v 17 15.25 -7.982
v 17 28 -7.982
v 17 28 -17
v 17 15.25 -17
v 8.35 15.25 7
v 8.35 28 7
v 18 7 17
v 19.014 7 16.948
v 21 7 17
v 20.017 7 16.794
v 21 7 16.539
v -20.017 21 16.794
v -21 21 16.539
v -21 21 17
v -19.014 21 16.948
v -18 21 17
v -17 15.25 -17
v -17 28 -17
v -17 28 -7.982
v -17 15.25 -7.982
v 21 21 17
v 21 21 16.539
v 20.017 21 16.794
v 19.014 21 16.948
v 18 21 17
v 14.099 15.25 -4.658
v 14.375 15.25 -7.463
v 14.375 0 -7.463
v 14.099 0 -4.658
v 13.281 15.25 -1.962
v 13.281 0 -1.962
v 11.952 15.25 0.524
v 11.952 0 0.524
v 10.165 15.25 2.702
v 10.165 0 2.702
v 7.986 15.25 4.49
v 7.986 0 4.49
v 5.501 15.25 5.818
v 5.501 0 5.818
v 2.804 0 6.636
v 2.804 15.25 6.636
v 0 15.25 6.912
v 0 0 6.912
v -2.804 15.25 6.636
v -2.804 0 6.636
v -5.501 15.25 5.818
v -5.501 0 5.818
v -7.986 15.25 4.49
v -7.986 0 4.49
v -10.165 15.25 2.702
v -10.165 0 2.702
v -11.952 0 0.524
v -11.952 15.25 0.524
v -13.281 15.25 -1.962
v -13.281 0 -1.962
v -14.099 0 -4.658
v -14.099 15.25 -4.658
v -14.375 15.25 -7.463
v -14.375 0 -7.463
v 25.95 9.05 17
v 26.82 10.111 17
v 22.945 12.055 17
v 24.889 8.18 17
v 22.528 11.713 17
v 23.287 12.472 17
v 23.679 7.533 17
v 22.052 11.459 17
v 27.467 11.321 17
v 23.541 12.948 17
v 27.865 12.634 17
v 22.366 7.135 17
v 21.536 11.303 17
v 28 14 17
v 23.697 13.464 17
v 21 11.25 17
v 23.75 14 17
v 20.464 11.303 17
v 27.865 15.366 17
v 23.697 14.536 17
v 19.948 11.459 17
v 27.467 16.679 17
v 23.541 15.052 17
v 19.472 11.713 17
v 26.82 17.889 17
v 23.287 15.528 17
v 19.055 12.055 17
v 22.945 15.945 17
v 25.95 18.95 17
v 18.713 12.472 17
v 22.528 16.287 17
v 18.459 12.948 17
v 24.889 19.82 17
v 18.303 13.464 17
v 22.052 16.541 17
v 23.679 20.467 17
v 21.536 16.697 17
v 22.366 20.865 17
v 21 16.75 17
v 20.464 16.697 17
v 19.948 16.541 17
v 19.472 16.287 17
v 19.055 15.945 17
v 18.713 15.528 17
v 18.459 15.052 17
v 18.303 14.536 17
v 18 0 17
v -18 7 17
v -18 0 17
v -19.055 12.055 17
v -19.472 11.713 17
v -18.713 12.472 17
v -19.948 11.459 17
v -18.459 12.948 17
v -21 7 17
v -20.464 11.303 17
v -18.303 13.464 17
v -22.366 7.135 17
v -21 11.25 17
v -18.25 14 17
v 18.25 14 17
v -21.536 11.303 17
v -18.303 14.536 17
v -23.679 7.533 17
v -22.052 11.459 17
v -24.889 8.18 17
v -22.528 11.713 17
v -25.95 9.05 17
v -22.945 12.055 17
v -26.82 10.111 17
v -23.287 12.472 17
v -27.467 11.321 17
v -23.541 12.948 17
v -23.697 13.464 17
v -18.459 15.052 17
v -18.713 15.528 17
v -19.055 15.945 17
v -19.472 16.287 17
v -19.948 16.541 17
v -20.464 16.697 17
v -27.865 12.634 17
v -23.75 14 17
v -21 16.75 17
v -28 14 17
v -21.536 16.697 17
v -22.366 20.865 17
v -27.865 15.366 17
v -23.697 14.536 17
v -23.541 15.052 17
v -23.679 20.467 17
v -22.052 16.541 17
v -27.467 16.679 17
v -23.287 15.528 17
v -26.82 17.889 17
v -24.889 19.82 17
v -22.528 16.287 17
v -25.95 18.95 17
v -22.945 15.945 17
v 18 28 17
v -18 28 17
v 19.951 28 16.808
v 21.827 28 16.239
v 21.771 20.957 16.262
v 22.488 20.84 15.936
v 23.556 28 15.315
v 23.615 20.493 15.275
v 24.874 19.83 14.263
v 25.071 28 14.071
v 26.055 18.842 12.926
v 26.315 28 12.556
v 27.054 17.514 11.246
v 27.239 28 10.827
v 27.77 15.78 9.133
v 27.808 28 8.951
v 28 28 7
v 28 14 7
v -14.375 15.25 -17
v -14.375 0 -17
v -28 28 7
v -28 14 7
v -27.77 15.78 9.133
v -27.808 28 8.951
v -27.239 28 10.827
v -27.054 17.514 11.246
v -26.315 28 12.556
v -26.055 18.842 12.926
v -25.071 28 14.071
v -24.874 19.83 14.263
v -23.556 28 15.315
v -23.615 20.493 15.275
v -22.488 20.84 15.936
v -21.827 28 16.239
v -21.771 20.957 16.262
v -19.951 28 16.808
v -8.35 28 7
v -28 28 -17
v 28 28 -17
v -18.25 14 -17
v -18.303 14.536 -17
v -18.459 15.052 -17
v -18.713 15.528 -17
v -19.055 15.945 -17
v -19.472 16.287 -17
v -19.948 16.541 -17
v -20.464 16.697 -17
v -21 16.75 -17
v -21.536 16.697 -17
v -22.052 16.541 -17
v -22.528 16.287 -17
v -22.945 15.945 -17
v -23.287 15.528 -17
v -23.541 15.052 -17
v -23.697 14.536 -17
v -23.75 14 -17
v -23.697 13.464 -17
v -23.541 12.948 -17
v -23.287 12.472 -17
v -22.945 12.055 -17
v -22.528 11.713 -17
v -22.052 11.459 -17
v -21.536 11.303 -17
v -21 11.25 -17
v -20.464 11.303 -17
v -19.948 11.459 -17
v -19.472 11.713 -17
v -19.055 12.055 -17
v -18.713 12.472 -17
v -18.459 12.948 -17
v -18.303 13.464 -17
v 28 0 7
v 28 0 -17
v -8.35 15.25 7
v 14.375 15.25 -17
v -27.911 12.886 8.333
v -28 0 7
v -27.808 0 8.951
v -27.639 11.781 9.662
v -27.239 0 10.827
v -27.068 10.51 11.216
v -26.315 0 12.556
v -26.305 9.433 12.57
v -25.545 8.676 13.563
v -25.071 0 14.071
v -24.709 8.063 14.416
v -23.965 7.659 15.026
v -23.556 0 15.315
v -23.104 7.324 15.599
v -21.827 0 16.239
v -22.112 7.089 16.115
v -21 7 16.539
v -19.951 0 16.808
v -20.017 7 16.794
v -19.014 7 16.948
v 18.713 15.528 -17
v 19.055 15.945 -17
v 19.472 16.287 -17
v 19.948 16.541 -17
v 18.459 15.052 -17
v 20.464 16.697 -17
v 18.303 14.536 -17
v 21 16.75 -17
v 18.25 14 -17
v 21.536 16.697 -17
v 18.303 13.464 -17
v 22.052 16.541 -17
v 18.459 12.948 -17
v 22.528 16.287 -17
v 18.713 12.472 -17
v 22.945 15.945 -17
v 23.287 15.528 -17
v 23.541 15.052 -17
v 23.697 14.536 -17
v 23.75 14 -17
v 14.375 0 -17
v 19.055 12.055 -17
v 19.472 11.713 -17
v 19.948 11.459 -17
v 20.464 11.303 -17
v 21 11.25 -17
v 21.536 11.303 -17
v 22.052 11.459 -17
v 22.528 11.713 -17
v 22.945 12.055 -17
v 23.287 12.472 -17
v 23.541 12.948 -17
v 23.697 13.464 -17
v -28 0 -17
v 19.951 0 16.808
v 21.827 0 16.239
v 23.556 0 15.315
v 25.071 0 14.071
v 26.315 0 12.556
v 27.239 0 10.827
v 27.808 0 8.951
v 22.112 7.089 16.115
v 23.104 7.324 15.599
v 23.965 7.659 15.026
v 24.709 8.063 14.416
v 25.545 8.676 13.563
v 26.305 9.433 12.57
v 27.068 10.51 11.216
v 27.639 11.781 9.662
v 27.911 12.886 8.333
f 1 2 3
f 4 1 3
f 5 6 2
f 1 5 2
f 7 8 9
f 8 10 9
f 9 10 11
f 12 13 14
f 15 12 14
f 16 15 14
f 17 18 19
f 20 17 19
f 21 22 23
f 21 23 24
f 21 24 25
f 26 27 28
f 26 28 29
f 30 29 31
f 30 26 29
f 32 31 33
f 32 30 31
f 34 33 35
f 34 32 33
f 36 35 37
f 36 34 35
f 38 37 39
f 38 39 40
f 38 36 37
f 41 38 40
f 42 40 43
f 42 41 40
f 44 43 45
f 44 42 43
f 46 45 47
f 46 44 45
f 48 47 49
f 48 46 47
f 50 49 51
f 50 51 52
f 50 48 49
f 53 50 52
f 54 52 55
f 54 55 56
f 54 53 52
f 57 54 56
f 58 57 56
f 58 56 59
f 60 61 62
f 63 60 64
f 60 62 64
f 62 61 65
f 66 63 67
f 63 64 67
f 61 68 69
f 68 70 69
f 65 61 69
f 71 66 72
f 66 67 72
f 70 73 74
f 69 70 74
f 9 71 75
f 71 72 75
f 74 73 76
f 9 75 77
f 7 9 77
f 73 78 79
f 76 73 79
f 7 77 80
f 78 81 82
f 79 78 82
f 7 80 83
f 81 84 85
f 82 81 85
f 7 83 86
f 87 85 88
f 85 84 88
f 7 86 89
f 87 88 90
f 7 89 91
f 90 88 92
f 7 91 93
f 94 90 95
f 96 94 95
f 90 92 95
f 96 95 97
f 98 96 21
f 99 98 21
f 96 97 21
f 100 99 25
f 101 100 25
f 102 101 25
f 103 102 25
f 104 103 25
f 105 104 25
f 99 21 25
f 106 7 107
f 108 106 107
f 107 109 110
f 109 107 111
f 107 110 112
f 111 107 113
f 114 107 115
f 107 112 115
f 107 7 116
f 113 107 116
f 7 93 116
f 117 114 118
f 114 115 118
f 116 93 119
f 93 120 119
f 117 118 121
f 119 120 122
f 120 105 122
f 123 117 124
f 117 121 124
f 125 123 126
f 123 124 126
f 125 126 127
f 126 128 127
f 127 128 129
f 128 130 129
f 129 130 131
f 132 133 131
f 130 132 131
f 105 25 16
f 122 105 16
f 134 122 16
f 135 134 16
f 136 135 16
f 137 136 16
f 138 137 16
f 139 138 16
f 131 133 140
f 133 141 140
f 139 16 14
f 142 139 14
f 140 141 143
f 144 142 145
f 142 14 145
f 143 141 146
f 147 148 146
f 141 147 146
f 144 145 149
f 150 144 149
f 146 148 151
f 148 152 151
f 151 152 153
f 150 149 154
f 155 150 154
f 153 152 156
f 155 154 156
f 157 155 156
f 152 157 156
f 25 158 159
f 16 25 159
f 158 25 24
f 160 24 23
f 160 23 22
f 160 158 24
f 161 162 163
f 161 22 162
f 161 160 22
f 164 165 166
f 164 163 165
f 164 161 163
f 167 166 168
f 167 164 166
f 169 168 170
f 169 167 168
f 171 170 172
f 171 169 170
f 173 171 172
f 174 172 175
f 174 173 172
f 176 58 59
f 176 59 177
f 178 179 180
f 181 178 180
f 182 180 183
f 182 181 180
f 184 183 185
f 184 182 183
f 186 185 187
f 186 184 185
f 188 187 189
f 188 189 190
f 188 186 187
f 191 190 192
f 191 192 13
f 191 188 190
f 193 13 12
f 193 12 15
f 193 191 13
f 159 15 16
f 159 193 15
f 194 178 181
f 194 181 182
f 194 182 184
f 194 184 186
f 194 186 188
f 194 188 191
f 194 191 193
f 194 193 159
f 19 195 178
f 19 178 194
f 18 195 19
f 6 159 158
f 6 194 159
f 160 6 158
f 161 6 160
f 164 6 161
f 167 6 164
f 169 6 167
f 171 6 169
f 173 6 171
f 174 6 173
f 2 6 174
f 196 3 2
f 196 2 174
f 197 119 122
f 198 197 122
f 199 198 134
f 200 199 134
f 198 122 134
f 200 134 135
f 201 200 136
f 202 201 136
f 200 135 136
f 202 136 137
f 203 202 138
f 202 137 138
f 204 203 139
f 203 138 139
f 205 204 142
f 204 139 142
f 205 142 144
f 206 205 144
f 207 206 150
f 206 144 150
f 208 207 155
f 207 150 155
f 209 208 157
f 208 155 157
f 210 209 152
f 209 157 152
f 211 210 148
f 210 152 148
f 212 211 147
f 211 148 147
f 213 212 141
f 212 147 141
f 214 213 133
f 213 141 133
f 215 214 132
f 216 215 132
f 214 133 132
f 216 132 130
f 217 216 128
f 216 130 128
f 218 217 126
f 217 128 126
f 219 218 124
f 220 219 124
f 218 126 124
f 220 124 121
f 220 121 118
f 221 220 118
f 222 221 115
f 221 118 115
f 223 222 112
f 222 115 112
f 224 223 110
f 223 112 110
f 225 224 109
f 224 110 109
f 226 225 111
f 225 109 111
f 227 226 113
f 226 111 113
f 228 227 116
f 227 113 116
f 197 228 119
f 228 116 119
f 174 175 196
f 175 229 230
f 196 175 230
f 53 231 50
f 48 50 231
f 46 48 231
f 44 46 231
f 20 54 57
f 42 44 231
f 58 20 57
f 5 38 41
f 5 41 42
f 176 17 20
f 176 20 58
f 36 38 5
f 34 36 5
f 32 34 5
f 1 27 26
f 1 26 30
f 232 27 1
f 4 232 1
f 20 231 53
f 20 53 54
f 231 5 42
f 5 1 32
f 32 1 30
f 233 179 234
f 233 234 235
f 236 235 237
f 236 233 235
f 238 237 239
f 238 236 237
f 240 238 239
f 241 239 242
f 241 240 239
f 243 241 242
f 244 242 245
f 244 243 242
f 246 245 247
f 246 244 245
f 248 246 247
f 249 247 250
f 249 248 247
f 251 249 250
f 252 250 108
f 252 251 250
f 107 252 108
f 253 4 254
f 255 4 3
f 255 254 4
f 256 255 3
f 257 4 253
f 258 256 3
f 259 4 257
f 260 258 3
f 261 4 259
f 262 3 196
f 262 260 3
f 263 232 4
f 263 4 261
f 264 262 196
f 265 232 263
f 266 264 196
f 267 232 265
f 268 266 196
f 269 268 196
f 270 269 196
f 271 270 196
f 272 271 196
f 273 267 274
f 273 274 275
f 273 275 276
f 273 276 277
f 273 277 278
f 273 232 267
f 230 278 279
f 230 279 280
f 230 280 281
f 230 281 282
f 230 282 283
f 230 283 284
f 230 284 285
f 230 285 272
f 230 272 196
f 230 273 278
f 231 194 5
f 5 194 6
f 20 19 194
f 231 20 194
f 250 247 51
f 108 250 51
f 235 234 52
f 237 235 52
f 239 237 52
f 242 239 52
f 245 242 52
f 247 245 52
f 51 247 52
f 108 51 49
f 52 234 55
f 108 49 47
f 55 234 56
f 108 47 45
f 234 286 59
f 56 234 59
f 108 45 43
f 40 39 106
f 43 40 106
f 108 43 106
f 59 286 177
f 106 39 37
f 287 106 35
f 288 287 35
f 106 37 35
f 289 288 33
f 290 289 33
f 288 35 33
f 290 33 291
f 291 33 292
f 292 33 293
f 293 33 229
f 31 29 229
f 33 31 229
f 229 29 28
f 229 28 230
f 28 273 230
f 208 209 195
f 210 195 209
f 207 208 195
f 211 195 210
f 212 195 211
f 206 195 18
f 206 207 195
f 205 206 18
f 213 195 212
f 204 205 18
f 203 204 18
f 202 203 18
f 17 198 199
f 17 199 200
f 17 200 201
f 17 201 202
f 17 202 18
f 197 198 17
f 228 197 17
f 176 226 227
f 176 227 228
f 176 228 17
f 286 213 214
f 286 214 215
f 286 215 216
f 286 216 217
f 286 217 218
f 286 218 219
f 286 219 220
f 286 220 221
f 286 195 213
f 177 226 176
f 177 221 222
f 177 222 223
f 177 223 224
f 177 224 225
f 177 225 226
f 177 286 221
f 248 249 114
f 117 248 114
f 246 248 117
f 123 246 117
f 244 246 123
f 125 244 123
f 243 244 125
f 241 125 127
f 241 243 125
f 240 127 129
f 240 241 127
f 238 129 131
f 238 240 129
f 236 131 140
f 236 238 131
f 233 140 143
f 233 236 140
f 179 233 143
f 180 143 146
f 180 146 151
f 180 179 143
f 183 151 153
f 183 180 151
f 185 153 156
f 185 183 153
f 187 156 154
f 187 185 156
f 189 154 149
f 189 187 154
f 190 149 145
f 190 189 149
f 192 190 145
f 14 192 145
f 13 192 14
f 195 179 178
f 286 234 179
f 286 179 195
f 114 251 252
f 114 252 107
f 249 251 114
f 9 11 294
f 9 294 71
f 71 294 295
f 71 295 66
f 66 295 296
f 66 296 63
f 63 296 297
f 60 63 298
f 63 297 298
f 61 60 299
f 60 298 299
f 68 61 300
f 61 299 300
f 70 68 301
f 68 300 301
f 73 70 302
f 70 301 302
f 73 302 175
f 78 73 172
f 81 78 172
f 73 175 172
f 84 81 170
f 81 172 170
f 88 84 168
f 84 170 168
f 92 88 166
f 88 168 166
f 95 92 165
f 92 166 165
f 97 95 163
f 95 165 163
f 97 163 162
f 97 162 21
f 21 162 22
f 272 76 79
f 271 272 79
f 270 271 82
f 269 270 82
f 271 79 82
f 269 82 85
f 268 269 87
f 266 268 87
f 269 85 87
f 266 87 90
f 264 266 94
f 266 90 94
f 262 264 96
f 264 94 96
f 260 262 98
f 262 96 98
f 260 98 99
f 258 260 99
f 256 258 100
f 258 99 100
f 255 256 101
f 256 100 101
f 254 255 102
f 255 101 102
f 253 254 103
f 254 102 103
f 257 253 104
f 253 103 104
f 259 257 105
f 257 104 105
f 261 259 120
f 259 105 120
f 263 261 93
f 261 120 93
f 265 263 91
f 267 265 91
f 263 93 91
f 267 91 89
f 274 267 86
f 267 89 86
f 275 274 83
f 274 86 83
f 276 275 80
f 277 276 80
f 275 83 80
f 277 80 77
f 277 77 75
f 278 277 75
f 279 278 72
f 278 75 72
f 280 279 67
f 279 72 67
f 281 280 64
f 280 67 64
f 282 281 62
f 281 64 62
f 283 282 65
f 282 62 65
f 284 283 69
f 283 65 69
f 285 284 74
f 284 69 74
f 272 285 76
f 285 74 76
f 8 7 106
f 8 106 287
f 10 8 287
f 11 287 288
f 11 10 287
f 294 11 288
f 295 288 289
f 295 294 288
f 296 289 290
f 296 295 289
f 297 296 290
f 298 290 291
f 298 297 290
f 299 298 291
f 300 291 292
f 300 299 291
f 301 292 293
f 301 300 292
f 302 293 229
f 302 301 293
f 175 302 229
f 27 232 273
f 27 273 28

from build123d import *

# Parameters (mm, degrees)
SKETCH1_W           = 56
SKETCH1_H           = 34
BOSS_EXTRUDE1_DEPTH = 28
CUT_EXTRUDE1_DEPTH  = 12.75
CUT_EXTRUDE2_DEPTH  = 15.25
FILLET1_R           = 10
BOSS_EXTRUDE2_DEPTH = 10
SKETCH6_R           = 2.75
CUT_EXTRUDE3_DEPTH  = 34


with BuildPart() as part:
    # Sketch1 → Boss-Extrude1 (new body)
    with BuildSketch(Plane(origin=(0, 0, 0), x_dir=(1, 0, 0), z_dir=(0, 1, 0))):
        Rectangle(SKETCH1_W, SKETCH1_H)
    extrude(amount=BOSS_EXTRUDE1_DEPTH)

    # Sketch2 → Cut-Extrude1 (cut)
    with BuildSketch(Plane(origin=(0, 28, 0), x_dir=(1, 0, 0), z_dir=(0, 1, 0))):
        Polygon((-17, 7.982239485), (-8.35, -7), (8.35, -7), (17, 7.982239485), (17, 17), (-17, 17), align=None)
    extrude(amount=-CUT_EXTRUDE1_DEPTH, mode=Mode.SUBTRACT)

    # Sketch3 → Cut-Extrude2 (cut)
    with BuildSketch(Plane(origin=(0, 15.25, 0), x_dir=(1, 0, 0), z_dir=(0, 1, 0))):
        with BuildLine():
            Line((-14.375, 7.462624243), (-14.375, 17))
            Line((-14.375, 17), (14.375, 17))
            Line((14.375, 17), (14.375, 7.462624243))
            ThreePointArc((14.375, 7.462624243), (0, -6.912375757), (-14.375, 7.462624243))
        make_face()
    extrude(amount=-CUT_EXTRUDE2_DEPTH, mode=Mode.SUBTRACT)

    # Fillet1
    fillet1_edges = [part.edges().sort_by_distance(p)[0] for p in [
        (28, 14, 17),
        (-28, 14, 17),
    ]]
    fillet(fillet1_edges, radius=FILLET1_R)

    # Sketch5 → Boss-Extrude2 (add)
    with BuildSketch(Plane(origin=(0, 0, 7), x_dir=(-1, 0, 0), z_dir=(0, 0, -1))):
        with BuildLine():
            Line((18, 21), (18, 7))
            Line((18, 7), (21, 7))
            ThreePointArc((21, 7), (28, 14), (21, 21))
            Line((21, 21), (18, 21))
        make_face()
        with BuildLine():
            Line((-18, 7), (-21, 7))
            ThreePointArc((-21, 7), (-28, 14), (-21, 21))
            Line((-21, 21), (-18, 21))
            Line((-18, 21), (-18, 7))
        make_face()
    extrude(amount=-BOSS_EXTRUDE2_DEPTH)

    # Sketch6 → Cut-Extrude3 (cut)
    with BuildSketch(Plane.XY.offset(17)):
        with Locations((-21, 14)):
            Circle(SKETCH6_R)
        with Locations((21, 14)):
            Circle(SKETCH6_R)
    extrude(amount=-CUT_EXTRUDE3_DEPTH, mode=Mode.SUBTRACT)


solid = part.part
